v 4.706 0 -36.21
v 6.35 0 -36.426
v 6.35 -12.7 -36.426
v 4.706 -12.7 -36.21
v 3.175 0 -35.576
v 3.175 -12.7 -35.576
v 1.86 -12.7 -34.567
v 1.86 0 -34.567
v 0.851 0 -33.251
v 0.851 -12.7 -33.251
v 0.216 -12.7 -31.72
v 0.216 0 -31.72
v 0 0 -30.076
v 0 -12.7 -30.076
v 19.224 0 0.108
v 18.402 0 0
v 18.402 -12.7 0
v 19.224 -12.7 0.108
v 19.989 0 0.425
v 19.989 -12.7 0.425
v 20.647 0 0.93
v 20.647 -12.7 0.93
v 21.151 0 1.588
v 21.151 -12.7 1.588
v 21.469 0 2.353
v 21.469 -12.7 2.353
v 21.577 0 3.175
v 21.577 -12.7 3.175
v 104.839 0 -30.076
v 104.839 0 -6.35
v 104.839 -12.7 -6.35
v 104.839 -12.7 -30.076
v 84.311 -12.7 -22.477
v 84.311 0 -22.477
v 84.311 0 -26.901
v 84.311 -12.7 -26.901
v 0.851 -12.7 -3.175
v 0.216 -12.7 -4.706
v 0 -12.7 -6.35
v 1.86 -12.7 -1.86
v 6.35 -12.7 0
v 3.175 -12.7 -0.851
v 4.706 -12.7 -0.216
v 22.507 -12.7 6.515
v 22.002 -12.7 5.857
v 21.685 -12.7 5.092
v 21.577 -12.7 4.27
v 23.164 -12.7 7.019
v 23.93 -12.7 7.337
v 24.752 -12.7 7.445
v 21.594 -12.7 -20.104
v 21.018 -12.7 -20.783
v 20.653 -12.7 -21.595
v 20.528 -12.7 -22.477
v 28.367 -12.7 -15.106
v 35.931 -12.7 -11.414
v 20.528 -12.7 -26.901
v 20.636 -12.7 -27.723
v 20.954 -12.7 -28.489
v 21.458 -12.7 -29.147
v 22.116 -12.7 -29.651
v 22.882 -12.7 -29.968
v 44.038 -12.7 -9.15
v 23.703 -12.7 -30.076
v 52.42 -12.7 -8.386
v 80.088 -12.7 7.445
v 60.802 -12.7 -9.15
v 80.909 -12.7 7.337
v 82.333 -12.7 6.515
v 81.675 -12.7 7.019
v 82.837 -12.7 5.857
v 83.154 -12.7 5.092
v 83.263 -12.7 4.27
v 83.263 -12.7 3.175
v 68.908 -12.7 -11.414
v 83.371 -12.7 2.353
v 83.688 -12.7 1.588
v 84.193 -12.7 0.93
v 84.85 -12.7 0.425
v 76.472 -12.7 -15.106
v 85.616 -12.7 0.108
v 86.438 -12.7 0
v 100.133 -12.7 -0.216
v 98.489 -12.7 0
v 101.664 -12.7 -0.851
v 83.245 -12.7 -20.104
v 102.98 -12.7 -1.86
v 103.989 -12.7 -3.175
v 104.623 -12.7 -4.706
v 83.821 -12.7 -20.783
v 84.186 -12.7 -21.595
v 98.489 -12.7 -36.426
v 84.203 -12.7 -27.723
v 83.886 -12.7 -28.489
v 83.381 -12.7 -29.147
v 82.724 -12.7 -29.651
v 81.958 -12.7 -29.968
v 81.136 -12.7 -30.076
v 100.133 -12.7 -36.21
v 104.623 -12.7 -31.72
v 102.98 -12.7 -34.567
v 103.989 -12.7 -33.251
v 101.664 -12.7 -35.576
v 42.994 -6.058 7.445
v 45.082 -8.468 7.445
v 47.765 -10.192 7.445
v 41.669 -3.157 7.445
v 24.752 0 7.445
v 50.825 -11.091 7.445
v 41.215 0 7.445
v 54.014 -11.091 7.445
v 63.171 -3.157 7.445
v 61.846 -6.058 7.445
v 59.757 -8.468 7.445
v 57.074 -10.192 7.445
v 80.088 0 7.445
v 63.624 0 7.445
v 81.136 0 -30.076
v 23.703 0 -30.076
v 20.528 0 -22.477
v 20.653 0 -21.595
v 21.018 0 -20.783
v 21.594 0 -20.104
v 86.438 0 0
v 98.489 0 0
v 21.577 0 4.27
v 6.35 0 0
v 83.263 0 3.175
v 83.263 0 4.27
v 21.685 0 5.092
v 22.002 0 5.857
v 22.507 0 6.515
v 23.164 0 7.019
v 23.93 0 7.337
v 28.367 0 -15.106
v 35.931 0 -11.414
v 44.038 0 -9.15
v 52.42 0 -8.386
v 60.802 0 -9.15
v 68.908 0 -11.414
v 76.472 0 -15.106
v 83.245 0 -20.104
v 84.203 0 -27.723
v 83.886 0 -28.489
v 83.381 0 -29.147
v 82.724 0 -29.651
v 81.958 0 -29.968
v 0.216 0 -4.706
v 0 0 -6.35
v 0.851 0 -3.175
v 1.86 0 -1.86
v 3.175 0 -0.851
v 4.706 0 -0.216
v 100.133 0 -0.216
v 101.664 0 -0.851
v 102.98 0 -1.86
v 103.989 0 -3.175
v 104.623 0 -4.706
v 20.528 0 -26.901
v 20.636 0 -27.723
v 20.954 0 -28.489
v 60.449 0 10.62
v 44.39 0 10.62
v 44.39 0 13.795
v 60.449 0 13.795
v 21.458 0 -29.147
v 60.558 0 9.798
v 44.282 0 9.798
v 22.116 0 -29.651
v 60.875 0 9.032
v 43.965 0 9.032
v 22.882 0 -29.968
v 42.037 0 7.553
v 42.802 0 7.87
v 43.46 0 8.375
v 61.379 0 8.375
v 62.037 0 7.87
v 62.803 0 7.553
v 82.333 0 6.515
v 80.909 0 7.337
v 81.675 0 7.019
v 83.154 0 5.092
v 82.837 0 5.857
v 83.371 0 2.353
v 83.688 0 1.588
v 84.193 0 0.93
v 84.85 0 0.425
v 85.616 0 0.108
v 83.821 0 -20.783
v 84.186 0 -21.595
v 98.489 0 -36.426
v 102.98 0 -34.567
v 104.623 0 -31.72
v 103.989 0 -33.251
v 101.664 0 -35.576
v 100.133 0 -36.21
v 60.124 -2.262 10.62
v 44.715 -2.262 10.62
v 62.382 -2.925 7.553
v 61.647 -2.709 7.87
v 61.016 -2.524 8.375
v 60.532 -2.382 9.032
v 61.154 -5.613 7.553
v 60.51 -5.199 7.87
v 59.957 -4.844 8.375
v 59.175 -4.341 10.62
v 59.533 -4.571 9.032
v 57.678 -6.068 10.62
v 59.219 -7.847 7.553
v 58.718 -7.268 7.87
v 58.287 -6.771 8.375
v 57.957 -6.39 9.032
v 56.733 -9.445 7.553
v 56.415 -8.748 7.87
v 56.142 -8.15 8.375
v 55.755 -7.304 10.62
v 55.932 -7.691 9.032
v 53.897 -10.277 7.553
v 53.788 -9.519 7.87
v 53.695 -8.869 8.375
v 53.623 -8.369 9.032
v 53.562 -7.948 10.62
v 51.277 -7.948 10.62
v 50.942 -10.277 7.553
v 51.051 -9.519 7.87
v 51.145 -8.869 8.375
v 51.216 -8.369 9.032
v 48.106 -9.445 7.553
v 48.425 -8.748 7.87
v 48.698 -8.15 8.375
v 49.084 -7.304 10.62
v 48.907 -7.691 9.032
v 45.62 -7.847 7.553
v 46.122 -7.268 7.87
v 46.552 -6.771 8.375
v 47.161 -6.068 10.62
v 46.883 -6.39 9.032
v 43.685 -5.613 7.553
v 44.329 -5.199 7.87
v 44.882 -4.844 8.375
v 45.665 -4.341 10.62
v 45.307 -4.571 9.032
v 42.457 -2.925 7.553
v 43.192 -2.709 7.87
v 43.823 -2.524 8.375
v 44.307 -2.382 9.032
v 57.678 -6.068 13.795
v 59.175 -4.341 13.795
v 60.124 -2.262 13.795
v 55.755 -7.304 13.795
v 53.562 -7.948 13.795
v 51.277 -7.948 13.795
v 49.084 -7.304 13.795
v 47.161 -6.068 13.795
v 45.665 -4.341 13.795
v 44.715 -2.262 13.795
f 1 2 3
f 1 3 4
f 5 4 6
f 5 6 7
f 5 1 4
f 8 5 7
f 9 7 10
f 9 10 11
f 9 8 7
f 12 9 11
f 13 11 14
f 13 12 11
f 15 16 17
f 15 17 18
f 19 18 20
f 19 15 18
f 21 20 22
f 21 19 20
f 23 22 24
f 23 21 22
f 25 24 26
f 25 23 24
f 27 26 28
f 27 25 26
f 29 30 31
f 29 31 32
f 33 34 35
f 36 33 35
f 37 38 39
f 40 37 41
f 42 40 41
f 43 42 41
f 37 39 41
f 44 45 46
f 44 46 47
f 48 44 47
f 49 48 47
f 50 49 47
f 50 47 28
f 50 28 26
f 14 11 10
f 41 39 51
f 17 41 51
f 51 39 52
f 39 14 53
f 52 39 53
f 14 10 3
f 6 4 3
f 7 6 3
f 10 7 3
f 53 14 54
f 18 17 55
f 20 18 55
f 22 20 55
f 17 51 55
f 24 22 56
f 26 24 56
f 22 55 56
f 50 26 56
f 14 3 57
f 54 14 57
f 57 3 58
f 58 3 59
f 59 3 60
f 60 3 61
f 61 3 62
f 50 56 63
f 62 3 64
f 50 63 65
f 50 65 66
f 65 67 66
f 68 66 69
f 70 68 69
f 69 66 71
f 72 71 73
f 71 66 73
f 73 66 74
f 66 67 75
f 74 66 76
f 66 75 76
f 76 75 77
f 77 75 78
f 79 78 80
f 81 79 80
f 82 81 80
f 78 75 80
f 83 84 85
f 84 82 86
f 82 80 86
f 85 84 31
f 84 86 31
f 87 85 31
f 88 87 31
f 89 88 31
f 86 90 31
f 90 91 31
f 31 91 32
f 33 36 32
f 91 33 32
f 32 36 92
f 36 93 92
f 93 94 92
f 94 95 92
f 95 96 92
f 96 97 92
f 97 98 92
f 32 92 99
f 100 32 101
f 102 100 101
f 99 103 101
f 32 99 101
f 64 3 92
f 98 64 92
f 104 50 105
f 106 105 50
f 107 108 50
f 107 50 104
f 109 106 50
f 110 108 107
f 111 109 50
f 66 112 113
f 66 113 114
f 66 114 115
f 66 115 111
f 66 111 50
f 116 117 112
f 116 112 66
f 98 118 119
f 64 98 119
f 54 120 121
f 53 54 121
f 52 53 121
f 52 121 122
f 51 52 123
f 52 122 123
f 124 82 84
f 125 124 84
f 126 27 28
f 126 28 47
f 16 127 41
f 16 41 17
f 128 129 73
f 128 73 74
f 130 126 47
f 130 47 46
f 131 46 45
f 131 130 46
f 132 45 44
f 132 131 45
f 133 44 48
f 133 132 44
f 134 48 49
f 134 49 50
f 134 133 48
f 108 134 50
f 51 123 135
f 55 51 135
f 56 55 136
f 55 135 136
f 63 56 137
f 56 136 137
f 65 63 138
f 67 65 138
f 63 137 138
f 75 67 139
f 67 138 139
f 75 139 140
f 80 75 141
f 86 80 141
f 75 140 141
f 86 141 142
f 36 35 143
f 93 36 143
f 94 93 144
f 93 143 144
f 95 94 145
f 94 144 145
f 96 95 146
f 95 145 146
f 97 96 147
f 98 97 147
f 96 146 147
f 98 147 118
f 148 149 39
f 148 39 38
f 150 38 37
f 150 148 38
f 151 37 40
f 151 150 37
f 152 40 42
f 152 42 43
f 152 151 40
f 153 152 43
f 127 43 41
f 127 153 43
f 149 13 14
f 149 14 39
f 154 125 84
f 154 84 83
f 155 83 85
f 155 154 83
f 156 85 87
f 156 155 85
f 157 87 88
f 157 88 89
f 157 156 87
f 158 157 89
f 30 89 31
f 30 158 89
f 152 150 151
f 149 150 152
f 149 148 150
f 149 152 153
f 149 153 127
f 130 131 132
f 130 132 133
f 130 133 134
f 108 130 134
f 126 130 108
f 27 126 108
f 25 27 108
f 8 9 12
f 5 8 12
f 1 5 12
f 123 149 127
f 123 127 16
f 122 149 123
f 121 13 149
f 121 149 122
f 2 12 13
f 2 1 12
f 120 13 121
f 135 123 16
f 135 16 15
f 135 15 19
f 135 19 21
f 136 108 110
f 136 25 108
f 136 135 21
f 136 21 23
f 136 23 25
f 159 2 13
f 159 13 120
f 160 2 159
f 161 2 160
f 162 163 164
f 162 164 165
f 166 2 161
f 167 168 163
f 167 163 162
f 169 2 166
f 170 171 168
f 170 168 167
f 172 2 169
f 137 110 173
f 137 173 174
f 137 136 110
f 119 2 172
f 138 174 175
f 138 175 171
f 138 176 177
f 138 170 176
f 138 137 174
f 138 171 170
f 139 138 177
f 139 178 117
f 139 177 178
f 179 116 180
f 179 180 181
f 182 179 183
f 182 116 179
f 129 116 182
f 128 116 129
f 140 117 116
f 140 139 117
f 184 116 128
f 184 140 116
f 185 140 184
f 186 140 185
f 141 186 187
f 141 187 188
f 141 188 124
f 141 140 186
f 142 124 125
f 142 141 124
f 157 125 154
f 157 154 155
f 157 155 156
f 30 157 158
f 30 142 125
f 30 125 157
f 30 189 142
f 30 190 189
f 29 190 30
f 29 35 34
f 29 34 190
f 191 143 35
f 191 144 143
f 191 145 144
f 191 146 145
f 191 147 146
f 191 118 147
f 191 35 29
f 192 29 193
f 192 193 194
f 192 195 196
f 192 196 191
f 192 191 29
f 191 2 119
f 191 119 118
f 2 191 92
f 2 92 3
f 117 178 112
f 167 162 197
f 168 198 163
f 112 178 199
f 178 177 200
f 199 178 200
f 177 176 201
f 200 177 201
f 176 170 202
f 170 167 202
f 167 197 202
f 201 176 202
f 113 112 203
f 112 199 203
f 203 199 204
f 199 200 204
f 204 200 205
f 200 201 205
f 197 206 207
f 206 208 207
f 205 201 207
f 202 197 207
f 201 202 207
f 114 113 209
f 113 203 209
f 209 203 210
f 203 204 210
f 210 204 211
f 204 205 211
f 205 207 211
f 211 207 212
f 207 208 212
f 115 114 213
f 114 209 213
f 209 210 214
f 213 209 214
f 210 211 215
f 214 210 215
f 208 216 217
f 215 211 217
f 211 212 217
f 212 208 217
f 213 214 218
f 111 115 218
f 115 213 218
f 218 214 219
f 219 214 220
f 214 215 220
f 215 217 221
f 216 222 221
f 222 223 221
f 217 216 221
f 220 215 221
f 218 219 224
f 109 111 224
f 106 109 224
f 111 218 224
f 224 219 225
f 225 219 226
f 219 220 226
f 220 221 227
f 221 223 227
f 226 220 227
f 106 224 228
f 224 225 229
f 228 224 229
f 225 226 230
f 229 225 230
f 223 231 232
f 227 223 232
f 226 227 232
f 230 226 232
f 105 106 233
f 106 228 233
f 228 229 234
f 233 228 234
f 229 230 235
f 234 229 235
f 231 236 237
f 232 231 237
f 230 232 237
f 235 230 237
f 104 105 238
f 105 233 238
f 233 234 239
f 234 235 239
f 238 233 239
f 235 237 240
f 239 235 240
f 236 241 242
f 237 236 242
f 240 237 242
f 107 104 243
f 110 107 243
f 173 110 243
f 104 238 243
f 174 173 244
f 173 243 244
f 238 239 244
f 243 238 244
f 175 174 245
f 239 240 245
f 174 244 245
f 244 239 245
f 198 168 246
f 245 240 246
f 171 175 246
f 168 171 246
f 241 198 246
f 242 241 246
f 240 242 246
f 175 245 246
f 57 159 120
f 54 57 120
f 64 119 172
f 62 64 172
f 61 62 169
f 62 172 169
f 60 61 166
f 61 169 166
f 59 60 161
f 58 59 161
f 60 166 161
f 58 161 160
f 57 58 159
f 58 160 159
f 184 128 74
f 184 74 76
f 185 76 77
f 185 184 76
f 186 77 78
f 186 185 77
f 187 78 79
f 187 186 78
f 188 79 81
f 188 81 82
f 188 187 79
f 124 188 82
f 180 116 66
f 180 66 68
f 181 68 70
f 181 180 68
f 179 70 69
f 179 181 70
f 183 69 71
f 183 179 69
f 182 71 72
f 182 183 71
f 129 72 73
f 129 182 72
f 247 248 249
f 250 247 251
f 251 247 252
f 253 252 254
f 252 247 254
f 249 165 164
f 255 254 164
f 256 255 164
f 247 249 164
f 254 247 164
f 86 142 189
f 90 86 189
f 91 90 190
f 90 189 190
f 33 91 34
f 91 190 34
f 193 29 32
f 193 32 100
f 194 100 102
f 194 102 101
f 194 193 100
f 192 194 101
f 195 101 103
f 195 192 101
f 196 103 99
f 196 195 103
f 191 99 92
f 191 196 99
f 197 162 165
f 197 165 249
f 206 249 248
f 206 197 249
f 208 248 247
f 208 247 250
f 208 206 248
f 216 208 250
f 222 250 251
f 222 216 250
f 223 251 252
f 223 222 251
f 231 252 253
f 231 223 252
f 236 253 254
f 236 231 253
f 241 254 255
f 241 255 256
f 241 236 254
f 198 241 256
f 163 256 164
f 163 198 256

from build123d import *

# Parameters (mm, degrees)
EXTRUDE1_DEPTH = 12.7
EXTRUDE2_DEPTH = 6.35
FILLET1_R      = 3.175


with BuildPart() as part:
    # Sketch1 → Extrude1 (new body)
    with BuildSketch(Plane(origin=(0, 0, 0), x_dir=(1, 0, 0), z_dir=(0, 1, 0))):
        with BuildLine():
            Line((0, 30.076477833), (0, 6.35))
            ThreePointArc((0, 6.35), (1.859871939, 1.859871939), (6.35, 0))
            Line((6.35, 0), (18.40185504, 0))
            ThreePointArc((18.40185504, 0), (20.64691907, -0.92993597), (21.57685504, -3.175))
            Line((21.57685504, -3.175), (21.57685504, -4.269827586))
            ThreePointArc((21.57685504, -4.269827586), (22.506791009, -6.514891616), (24.75185504, -7.444827586))
            Line((24.75185504, -7.444827586), (80.087569325, -7.444827586))
            ThreePointArc((80.087569325, -7.444827586), (82.332633356, -6.514891616), (83.262569325, -4.269827586))
            Line((83.262569325, -4.269827586), (83.262569325, -3.175))
            ThreePointArc((83.262569325, -3.175), (84.192505295, -0.92993597), (86.437569325, 0))
            Line((86.437569325, 0), (98.489424365, 0))
            ThreePointArc((98.489424365, 0), (102.979552425, 1.859871939), (104.839424365, 6.35))
            Line((104.839424365, 6.35), (104.839424365, 30.076477833))
            ThreePointArc((104.839424365, 30.076477833), (102.979552425, 34.566605893), (98.489424365, 36.426477833))
            Line((98.489424365, 36.426477833), (6.35, 36.426477833))
            ThreePointArc((6.35, 36.426477833), (1.859871939, 34.566605893), (0, 30.076477833))
        make_face()
        with BuildLine():
            Line((81.136140344, 30.076477833), (23.703284021, 30.076477833))
            ThreePointArc((23.703284021, 30.076477833), (21.458219991, 29.146541863), (20.528284021, 26.901477833))
            Line((20.528284021, 26.901477833), (20.528284021, 22.476973979))
            ThreePointArc((20.528284021, 22.476973979), (20.807016141, 21.176106051), (21.594272913, 20.103643587))
            ThreePointArc((21.594272913, 20.103643587), (52.419712182, 8.386390066), (83.245151452, 20.103643587))
            ThreePointArc((83.245151452, 20.103643587), (84.032408224, 21.176106051), (84.311140344, 22.476973979))
            Line((84.311140344, 22.476973979), (84.311140344, 26.901477833))
            ThreePointArc((84.311140344, 26.901477833), (83.381204374, 29.146541863), (81.136140344, 30.076477833))
        make_face(mode=Mode.SUBTRACT)
    extrude(amount=-EXTRUDE1_DEPTH)

    # Sketch2 → Extrude2 (add)
    with BuildSketch(Plane.XY.offset(7.444827586)):
        with BuildLine():
            Line((44.389946351, 0), (60.449478013, 0))
            ThreePointArc((60.449478013, 0), (52.419712182, -8.029765831), (44.389946351, 0))
        make_face()
    extrude(amount=EXTRUDE2_DEPTH)

    # Fillet1
    fillet1_edges = [part.edges().sort_by_distance(p)[0] for p in [
        (52.419712182, -8.029765831, 7.444827586),
    ]]
    fillet(fillet1_edges, radius=FILLET1_R)


solid = part.part
